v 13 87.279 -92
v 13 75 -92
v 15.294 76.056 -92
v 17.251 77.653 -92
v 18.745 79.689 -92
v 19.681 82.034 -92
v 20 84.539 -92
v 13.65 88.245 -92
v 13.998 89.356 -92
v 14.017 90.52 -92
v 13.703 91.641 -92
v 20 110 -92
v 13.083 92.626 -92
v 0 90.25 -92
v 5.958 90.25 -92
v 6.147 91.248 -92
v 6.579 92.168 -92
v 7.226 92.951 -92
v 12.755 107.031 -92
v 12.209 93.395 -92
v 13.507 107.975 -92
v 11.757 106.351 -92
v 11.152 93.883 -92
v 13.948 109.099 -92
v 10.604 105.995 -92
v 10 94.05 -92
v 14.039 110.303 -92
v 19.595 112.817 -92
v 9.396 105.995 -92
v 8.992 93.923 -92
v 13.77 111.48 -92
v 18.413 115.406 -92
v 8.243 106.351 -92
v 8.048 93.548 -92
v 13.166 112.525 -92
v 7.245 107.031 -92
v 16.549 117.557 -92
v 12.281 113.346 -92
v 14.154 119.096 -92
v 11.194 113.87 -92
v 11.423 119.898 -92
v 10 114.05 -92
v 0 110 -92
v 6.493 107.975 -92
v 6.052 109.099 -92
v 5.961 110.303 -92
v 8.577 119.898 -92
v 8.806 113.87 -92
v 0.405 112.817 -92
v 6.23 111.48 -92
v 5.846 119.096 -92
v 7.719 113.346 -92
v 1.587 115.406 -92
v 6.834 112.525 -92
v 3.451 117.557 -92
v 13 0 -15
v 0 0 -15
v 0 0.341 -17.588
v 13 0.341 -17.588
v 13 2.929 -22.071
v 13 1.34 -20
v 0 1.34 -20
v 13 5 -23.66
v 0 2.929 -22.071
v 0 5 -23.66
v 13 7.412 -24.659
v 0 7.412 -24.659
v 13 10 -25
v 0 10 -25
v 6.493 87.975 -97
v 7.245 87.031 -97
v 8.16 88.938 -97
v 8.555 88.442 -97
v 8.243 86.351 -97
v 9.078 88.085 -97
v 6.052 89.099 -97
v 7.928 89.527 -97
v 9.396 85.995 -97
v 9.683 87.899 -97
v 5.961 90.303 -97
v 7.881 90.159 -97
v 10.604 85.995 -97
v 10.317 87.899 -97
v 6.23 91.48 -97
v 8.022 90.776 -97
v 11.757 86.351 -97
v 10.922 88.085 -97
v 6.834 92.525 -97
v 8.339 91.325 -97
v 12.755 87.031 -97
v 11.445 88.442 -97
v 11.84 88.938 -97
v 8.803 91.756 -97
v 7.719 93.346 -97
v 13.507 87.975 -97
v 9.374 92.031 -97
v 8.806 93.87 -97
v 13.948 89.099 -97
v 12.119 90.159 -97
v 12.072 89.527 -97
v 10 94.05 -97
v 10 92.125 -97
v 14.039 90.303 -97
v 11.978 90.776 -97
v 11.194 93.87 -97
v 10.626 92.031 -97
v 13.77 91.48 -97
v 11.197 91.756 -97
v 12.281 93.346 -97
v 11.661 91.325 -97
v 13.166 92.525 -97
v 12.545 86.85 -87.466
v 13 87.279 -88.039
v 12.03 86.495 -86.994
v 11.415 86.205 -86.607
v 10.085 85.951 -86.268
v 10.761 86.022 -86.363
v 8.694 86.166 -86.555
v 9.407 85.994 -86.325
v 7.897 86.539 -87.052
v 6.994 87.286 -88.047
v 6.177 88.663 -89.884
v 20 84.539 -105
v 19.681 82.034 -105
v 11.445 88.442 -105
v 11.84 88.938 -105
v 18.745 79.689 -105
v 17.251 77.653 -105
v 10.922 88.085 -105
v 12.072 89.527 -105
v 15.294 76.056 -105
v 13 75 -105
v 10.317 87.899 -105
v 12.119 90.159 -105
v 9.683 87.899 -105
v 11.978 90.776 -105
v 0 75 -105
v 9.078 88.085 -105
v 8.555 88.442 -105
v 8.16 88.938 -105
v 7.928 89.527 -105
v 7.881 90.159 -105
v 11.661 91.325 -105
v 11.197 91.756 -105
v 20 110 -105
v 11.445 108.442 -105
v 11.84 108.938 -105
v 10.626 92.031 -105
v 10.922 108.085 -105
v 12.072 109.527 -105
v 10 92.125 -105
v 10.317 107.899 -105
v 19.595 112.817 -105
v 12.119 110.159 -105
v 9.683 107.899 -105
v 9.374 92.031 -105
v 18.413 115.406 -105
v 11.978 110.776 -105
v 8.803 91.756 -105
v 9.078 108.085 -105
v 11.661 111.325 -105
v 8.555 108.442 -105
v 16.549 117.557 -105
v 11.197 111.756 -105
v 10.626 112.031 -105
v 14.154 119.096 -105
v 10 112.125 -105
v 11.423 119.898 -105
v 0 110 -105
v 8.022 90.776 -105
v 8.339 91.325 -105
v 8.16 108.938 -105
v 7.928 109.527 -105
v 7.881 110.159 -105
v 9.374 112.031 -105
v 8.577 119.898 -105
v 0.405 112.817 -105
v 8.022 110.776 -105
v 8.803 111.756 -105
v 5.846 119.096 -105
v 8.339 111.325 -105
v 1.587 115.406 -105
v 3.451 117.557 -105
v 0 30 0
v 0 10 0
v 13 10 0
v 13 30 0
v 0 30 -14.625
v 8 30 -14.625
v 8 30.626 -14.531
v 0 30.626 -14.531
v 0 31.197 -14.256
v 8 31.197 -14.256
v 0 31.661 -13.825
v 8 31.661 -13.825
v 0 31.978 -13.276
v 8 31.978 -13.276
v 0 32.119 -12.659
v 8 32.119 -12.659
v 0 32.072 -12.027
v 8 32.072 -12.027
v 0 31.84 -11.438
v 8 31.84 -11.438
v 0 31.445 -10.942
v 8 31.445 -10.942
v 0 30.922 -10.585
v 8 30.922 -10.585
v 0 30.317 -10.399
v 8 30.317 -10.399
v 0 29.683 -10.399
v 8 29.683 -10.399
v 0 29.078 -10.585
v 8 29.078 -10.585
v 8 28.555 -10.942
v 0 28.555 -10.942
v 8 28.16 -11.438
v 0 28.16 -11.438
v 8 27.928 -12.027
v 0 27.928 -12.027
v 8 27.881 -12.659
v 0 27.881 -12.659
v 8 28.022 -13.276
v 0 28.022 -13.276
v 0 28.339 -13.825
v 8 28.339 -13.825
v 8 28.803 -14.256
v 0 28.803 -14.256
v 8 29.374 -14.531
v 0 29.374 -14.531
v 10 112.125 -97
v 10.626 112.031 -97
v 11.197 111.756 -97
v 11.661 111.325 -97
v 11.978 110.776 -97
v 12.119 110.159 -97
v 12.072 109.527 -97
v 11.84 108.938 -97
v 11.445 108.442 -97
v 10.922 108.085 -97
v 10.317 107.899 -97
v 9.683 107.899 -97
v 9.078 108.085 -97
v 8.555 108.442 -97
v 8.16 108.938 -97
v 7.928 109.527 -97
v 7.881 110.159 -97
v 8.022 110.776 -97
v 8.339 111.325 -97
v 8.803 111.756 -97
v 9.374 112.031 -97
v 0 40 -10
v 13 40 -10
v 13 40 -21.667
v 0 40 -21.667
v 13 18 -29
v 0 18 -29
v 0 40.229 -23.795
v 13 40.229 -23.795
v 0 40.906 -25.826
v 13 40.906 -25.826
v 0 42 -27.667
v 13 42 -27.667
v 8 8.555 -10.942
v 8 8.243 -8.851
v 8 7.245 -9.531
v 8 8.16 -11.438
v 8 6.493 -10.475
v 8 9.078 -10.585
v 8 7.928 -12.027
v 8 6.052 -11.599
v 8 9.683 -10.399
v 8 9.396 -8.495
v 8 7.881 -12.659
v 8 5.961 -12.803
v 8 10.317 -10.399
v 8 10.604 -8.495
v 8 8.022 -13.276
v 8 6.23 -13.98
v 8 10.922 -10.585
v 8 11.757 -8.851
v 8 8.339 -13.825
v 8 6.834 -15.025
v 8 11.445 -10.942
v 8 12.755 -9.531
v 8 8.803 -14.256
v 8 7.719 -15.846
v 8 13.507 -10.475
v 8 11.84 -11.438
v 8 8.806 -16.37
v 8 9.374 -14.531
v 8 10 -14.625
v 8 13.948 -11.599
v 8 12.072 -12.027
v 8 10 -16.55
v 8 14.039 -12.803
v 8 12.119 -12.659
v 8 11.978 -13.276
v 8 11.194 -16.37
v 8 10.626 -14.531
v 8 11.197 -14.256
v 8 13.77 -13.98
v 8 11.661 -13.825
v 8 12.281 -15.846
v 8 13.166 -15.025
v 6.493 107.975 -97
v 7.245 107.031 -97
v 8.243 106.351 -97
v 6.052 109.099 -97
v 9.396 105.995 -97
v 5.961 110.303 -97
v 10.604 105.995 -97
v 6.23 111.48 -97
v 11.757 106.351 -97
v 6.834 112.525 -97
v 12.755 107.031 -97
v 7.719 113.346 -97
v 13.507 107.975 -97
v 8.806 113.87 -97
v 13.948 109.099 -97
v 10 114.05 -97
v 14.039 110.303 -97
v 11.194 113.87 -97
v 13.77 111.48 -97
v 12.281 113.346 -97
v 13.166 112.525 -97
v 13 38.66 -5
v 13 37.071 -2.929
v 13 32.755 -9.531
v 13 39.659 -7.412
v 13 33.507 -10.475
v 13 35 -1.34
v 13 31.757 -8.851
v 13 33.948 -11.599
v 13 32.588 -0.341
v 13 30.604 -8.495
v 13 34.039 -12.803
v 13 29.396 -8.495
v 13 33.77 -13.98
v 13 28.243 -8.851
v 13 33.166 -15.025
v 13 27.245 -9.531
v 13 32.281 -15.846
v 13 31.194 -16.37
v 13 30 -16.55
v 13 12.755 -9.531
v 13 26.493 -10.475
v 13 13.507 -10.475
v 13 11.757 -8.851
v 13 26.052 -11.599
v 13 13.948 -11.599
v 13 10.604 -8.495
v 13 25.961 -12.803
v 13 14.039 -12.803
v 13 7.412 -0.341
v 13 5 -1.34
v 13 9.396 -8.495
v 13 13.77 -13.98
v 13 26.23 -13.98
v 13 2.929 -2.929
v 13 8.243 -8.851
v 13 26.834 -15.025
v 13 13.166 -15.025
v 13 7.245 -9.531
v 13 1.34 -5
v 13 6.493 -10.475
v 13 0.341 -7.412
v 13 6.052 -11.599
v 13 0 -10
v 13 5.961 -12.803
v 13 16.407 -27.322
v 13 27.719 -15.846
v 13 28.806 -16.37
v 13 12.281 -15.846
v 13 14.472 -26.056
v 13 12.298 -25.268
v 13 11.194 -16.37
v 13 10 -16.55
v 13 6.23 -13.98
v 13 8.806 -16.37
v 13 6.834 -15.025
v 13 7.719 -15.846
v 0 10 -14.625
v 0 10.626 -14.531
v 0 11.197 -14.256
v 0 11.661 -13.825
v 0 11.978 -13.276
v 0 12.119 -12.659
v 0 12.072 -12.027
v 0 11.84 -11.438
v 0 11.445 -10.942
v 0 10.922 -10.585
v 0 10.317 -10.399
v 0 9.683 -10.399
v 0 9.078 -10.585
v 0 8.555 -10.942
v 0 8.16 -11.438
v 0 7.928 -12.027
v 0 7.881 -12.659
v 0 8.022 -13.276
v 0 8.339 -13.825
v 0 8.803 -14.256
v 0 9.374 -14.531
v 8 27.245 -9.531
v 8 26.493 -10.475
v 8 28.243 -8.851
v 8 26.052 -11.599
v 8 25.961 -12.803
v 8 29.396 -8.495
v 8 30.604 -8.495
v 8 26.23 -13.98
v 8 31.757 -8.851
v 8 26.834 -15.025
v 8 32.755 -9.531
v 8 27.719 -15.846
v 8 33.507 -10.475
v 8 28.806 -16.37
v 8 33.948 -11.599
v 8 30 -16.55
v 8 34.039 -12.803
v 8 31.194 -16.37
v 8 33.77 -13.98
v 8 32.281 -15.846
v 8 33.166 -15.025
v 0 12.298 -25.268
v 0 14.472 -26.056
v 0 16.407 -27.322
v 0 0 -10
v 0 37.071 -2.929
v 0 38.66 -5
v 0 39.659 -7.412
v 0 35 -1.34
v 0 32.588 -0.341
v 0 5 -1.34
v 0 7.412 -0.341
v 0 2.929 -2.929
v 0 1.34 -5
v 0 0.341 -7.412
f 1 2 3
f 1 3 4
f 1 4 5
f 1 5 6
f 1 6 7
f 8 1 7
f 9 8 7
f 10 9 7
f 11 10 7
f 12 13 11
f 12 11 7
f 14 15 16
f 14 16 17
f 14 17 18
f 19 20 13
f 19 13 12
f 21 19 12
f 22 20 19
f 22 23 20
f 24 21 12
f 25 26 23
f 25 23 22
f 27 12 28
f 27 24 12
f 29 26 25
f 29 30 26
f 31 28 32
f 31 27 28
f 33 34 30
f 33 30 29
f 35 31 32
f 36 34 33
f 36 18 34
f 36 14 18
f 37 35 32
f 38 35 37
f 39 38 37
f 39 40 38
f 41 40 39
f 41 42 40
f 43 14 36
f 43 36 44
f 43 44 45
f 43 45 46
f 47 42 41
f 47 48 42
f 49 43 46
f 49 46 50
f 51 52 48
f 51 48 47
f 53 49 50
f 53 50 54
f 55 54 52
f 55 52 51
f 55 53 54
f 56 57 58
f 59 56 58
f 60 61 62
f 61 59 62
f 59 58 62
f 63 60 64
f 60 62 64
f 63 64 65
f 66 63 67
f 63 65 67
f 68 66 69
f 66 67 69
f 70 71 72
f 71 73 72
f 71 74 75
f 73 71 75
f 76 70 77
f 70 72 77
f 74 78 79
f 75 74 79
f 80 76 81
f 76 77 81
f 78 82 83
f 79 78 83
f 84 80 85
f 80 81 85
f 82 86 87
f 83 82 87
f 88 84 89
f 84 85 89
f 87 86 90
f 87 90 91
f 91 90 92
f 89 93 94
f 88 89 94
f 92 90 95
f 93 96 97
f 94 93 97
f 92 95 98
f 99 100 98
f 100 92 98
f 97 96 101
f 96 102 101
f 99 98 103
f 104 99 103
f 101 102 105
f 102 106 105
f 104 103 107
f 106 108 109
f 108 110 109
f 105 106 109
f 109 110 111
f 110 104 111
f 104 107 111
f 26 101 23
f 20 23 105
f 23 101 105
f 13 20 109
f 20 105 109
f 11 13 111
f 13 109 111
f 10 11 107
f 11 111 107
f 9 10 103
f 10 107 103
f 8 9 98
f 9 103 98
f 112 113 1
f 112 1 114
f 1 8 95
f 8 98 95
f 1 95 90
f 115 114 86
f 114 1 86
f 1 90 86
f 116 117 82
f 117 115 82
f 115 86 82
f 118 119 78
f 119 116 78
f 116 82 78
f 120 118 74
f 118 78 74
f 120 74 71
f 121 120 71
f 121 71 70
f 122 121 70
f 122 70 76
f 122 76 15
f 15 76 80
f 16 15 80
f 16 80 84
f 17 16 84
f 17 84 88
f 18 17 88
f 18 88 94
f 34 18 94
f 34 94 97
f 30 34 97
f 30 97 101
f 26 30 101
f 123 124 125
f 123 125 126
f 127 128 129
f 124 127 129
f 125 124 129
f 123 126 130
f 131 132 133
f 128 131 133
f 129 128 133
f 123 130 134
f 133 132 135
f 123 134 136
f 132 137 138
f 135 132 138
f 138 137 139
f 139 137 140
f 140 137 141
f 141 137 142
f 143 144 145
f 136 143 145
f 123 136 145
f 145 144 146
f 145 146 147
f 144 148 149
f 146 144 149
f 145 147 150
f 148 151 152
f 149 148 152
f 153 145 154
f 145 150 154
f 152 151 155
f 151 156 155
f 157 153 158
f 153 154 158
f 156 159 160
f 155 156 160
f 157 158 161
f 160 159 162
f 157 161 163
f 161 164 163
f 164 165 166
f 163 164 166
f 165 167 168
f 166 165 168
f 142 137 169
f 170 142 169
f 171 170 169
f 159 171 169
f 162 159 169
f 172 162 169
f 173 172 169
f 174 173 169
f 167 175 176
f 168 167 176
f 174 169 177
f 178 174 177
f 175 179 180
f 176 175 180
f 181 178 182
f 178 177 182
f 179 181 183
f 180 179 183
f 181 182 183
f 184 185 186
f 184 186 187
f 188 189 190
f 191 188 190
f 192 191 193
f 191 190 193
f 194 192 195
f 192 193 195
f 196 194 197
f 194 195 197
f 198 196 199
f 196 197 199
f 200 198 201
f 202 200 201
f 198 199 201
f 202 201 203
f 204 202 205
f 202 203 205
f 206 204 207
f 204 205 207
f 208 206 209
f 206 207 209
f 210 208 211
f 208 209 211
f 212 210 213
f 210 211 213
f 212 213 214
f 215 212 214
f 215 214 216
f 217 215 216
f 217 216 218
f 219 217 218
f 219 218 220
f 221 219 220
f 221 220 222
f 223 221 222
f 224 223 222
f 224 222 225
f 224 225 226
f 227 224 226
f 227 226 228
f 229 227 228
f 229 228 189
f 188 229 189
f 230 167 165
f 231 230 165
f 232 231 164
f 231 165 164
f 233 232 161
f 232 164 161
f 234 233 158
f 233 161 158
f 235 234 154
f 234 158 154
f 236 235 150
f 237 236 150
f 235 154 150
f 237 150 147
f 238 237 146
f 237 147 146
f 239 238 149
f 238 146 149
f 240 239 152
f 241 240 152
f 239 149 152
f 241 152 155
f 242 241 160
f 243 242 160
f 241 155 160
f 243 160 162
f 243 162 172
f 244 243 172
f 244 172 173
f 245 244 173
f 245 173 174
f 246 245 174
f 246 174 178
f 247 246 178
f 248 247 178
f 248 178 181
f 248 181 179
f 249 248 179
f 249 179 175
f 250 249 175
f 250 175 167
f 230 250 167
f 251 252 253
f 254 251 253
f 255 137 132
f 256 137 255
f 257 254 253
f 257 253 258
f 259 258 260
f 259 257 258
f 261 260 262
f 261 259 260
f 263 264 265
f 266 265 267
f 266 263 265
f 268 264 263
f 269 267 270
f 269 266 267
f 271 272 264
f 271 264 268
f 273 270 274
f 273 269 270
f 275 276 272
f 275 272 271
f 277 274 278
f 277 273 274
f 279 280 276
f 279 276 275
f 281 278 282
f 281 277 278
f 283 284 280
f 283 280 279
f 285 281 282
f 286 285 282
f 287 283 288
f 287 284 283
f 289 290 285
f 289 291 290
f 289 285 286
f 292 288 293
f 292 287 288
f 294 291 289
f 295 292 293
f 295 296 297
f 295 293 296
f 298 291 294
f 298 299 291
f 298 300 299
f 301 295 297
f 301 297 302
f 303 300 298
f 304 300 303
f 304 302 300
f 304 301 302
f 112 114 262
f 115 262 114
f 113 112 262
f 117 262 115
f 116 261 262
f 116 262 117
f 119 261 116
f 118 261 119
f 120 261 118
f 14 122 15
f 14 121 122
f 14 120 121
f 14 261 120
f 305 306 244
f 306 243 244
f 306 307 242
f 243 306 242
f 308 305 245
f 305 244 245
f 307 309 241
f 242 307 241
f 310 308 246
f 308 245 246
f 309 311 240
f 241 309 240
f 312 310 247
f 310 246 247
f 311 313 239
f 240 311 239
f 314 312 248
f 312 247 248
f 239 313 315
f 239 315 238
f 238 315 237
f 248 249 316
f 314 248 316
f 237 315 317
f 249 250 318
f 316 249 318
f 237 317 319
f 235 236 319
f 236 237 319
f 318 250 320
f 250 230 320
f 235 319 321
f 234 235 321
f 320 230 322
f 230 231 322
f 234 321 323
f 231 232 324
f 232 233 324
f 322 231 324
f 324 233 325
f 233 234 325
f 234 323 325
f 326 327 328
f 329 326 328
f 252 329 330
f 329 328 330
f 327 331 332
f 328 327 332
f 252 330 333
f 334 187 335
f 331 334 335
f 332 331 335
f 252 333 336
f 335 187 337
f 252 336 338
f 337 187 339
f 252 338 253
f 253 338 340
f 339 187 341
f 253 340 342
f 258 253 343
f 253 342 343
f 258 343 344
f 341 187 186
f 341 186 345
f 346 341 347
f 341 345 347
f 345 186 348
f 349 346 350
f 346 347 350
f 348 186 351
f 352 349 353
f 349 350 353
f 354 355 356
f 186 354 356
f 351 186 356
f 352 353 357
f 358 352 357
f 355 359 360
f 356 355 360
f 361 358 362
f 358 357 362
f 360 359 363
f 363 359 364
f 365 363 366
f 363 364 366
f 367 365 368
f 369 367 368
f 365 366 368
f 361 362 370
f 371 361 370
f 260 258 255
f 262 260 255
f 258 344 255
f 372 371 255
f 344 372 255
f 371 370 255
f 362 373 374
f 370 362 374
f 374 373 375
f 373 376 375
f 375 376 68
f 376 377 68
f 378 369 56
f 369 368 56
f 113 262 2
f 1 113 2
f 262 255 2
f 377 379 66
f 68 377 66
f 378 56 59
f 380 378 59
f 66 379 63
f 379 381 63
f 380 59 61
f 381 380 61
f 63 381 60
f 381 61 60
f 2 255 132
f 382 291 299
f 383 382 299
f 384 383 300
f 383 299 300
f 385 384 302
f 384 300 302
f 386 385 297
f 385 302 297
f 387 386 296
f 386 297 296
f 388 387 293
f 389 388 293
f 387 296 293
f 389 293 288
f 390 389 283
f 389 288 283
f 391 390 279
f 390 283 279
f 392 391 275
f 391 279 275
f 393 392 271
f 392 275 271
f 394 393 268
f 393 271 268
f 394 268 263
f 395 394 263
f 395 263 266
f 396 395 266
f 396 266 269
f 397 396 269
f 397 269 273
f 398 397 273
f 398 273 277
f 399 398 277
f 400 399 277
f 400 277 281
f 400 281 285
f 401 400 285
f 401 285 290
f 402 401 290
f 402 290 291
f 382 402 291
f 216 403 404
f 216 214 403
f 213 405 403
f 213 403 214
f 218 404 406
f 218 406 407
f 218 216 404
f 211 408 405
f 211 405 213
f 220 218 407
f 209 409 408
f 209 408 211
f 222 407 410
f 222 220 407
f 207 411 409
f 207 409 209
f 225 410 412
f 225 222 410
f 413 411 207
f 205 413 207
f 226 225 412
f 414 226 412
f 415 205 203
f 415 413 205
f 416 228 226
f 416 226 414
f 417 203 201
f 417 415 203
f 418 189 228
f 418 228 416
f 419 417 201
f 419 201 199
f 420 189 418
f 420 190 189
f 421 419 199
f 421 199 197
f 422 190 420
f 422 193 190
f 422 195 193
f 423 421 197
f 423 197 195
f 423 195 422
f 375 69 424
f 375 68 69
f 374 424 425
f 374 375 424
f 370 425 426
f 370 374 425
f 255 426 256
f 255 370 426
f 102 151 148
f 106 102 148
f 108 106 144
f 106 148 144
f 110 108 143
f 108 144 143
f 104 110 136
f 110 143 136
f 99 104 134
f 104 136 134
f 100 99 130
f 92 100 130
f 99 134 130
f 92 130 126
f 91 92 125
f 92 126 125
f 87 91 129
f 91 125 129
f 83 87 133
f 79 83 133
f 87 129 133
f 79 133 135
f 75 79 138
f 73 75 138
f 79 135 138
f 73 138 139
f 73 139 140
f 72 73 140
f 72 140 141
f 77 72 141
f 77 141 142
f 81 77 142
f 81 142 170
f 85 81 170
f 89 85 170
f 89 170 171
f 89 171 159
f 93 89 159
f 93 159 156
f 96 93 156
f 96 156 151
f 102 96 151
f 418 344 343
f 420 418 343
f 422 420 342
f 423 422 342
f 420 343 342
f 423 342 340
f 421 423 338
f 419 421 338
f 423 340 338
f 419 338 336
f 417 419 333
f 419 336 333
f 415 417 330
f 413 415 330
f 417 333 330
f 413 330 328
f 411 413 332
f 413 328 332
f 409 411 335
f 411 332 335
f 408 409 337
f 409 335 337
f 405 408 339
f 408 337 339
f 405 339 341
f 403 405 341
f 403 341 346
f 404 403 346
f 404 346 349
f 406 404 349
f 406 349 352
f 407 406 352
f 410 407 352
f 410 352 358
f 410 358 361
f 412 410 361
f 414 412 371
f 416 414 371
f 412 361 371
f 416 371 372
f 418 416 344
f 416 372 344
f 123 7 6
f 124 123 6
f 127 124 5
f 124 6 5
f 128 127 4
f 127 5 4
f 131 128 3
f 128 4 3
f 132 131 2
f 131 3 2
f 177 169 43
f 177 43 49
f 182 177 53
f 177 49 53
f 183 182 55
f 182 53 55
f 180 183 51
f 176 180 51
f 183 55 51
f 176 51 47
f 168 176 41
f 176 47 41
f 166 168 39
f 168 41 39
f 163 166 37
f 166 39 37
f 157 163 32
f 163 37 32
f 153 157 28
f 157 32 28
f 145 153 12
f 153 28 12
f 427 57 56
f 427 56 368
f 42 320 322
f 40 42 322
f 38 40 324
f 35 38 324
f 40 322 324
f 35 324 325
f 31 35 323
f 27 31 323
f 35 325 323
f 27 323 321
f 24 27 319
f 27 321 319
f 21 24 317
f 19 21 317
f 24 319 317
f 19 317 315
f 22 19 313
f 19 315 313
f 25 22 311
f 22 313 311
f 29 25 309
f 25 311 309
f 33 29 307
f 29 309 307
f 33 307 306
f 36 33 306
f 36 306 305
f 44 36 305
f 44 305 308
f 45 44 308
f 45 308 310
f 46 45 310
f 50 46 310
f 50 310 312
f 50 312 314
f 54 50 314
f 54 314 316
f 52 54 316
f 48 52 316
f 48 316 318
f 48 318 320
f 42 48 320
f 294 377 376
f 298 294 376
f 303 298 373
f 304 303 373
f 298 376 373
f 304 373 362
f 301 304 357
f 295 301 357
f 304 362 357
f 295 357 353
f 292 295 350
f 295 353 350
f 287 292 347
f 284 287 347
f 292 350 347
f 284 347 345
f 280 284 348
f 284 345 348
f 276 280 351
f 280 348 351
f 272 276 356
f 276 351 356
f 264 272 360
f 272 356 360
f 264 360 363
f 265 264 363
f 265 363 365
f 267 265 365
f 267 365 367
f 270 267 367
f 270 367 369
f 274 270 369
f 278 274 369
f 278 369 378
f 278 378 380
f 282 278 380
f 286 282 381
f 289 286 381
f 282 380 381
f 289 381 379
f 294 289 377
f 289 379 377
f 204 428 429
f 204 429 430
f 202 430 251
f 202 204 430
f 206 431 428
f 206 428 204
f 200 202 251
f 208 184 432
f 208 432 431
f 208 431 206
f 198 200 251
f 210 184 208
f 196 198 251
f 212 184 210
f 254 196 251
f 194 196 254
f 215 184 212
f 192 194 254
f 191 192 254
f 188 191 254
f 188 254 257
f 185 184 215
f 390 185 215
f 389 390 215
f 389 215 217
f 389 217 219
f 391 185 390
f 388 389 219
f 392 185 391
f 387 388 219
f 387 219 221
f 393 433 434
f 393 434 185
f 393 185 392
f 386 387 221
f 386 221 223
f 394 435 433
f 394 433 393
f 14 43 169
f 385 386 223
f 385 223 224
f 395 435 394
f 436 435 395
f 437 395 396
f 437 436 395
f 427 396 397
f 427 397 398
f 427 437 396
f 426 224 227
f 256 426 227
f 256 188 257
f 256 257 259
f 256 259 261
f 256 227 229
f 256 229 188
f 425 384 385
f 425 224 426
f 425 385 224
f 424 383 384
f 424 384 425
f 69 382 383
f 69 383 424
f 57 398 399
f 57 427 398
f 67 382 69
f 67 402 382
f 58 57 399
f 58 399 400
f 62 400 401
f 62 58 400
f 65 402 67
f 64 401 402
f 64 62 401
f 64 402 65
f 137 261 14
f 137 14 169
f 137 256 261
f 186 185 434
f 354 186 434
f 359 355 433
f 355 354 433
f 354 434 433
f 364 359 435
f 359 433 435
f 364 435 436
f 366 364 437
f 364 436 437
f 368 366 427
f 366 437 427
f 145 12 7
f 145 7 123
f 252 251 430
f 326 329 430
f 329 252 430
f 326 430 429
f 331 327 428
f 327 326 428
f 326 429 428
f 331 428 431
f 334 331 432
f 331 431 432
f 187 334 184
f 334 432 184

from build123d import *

# Parameters (mm, degrees)
SALIENTE_EXTRUIR1_DEPTH = 13
CROQUIS4_W              = 13
CROQUIS4_H              = 45
SALIENTE_EXTRUIR2_DEPTH = 7
CROQUIS5_R              = 2.125
CORTAR_EXTRUIR1_DEPTH   = 160.981248901
CROQUIS6_R              = 4.05
CORTAR_EXTRUIR2_DEPTH   = 5
CORTAR_EXTRUIR3_REACH   = 162.702
CROQUIS7_R              = 2.125
CORTAR_EXTRUIR4_REACH   = 170.702
CORTAR_EXTRUIR4_START   = -8
CROQUIS8_R              = 4.05
REDONDEO2_R             = 10
REDONDEO5_R             = 10


with BuildPart() as part:
    # Croquis1 → Saliente-Extruir1 (new body)
    with BuildSketch(Plane(origin=(0, 0, 0), x_dir=(0, 0, -1), z_dir=(1, 0, 0))):
        Polygon((0, 0), (0, 40), (25, 40), (92, 90.25), (92, 120), (105, 120), (105, 75), (25, 15), (25, 0), align=None)
    extrude(amount=SALIENTE_EXTRUIR1_DEPTH)

    # Croquis4 → Saliente-Extruir2 (add)
    with BuildSketch(Plane(origin=(13, 0, 0), x_dir=(0, 0, -1), z_dir=(1, 0, 0))):
        with Locations((98.5, 97.5)):
            Rectangle(CROQUIS4_W, CROQUIS4_H)
    extrude(amount=SALIENTE_EXTRUIR2_DEPTH)

    # Croquis5 → Cortar-Extruir1 (cut, through all)
    with BuildSketch(Plane(origin=(13, 0, 0), x_dir=(0, 0, -1), z_dir=(1, 0, 0))):
        with Locations((12.5, 30)):
            Circle(CROQUIS5_R)
        with Locations((12.5, 10)):
            Circle(CROQUIS5_R)
    extrude(amount=-CORTAR_EXTRUIR1_DEPTH, mode=Mode.SUBTRACT)

    # Croquis6 → Cortar-Extruir2 (cut)
    with BuildSketch(Plane(origin=(13, 0, 0), x_dir=(0, 0, -1), z_dir=(1, 0, 0))):
        with Locations((12.5, 30)):
            Circle(CROQUIS6_R)
        with Locations((12.5, 10)):
            Circle(CROQUIS6_R)
    extrude(amount=-CORTAR_EXTRUIR2_DEPTH, mode=Mode.SUBTRACT)

    # Croquis7 → Cortar-Extruir3 (cut, up to next)
    with BuildSketch(Plane(origin=(0, 0, -105), x_dir=(-1, 0, 0), z_dir=(0, 0, -1)), mode=Mode.PRIVATE) as cortar_extruir3_sk1:
        with Locations(Location((-10, 110, 0), (0, 0, 90))):
            Circle(CROQUIS7_R)
    cortar_extruir3_tool1 = extrude(cortar_extruir3_sk1.sketch, amount=-CORTAR_EXTRUIR3_REACH, mode=Mode.PRIVATE) & part.part
    # Croquis7 → Cortar-Extruir3 (cut, up to next)
    with BuildSketch(Plane(origin=(0, 0, -105), x_dir=(-1, 0, 0), z_dir=(0, 0, -1)), mode=Mode.PRIVATE) as cortar_extruir3_sk2:
        with Locations(Location((-10, 90, 0), (0, 0, 90))):
            Circle(CROQUIS7_R)
    cortar_extruir3_tool2 = extrude(cortar_extruir3_sk2.sketch, amount=-CORTAR_EXTRUIR3_REACH, mode=Mode.PRIVATE) & part.part
    add(cortar_extruir3_tool1.solids().sort_by_distance((10, 110, -105))[0], mode=Mode.SUBTRACT)
    add(cortar_extruir3_tool2.solids().sort_by_distance((10, 90, -105))[0], mode=Mode.SUBTRACT)

    # Croquis8 → Cortar-Extruir4 (cut, up to next)
    with BuildSketch(Plane(origin=(0, 0, -105), x_dir=(-1, 0, 0), z_dir=(0, 0, -1)).offset(CORTAR_EXTRUIR4_START), mode=Mode.PRIVATE) as cortar_extruir4_sk1:
        with Locations(Location((-10, 110, 0), (0, 0, 90))):
            Circle(CROQUIS8_R)
    cortar_extruir4_tool1 = extrude(cortar_extruir4_sk1.sketch, amount=-CORTAR_EXTRUIR4_REACH, mode=Mode.PRIVATE) & part.part
    # Croquis8 → Cortar-Extruir4 (cut, up to next)
    with BuildSketch(Plane(origin=(0, 0, -105), x_dir=(-1, 0, 0), z_dir=(0, 0, -1)).offset(CORTAR_EXTRUIR4_START), mode=Mode.PRIVATE) as cortar_extruir4_sk2:
        with Locations(Location((-10, 90, 0), (0, 0, 90))):
            Circle(CROQUIS8_R)
    cortar_extruir4_tool2 = extrude(cortar_extruir4_sk2.sketch, amount=-CORTAR_EXTRUIR4_REACH, mode=Mode.PRIVATE) & part.part
    add(cortar_extruir4_tool1.solids().sort_by_distance((10, 110, -97))[0], mode=Mode.SUBTRACT)
    add(cortar_extruir4_tool2.solids().sort_by_distance((10, 90, -97))[0], mode=Mode.SUBTRACT)

    # Redondeo2
    redondeo2_edges = [part.edges().sort_by_distance(p)[0] for p in [
        (6.5, 15, -25),
    ]]
    fillet(redondeo2_edges, radius=REDONDEO2_R)

    # Redondeo5
    # the kernel refuses this fillet: 10 mm, written as the material it adds along each edge
    with BuildSketch(Plane(origin=(0, 40, -25), x_dir=(0, 0, 1), z_dir=(1, 0, 0))) as redondeo5_piece_1:
        with BuildLine():
            CenterArc((REDONDEO5_R * 0.333333333333, -REDONDEO5_R), REDONDEO5_R, 90, 36.869897646)
            Line((-REDONDEO5_R * 0.266666666667, -REDONDEO5_R * 0.2), (0, 0))
            Line((0, 0), (REDONDEO5_R * 0.333333333333, 0))
        make_face()
    extrude(amount=13)
    # the kernel refuses this fillet: 10 mm, written as the material it takes off along each edge
    with BuildSketch(Plane(origin=(-25, 0, 0), x_dir=(0, 0, -1), z_dir=(1, 0, 0)), Plane(origin=(-25, 0, -25), x_dir=(0, 1, 0), z_dir=(1, 0, 0)), Plane(origin=(-25, 40, 0), x_dir=(0, -1, 0), z_dir=(1, 0, 0)), Plane(origin=(20, 120, -130), x_dir=(-1, 0, 0), z_dir=(0, 0, 1))) as redondeo5_2_piece_1:
        with BuildLine():
            CenterArc((REDONDEO5_R, REDONDEO5_R), REDONDEO5_R, 180, 90)
            Line((0, REDONDEO5_R), (0, 0))
            Line((0, 0), (REDONDEO5_R, 0))
        make_face()
    extrude(amount=63, mode=Mode.SUBTRACT)
    with BuildSketch(Plane(origin=(20, 75, -68.151519965), x_dir=(0, 1, 0), z_dir=(0, 0, -1))) as redondeo5_2_piece_2:
        with BuildLine():
            CenterArc((9.539392014, -10), REDONDEO5_R, 90, 72.542396876)
            Line((0, -7), (0, 0))
            Line((0, 0), (9.539392014, 0))
        make_face()
    extrude(amount=60.696960071, mode=Mode.SUBTRACT)
    with BuildSketch(Plane(origin=(0, 120, -67), x_dir=(0, -1, 0), z_dir=(0, 0, -1))) as redondeo5_2_piece_3:
        with BuildLine():
            CenterArc((REDONDEO5_R, -REDONDEO5_R), REDONDEO5_R, 90, 90)
            Line((0, -REDONDEO5_R), (0, 0))
            Line((0, 0), (REDONDEO5_R, 0))
        make_face()
    extrude(amount=63, mode=Mode.SUBTRACT)


solid = part.part
